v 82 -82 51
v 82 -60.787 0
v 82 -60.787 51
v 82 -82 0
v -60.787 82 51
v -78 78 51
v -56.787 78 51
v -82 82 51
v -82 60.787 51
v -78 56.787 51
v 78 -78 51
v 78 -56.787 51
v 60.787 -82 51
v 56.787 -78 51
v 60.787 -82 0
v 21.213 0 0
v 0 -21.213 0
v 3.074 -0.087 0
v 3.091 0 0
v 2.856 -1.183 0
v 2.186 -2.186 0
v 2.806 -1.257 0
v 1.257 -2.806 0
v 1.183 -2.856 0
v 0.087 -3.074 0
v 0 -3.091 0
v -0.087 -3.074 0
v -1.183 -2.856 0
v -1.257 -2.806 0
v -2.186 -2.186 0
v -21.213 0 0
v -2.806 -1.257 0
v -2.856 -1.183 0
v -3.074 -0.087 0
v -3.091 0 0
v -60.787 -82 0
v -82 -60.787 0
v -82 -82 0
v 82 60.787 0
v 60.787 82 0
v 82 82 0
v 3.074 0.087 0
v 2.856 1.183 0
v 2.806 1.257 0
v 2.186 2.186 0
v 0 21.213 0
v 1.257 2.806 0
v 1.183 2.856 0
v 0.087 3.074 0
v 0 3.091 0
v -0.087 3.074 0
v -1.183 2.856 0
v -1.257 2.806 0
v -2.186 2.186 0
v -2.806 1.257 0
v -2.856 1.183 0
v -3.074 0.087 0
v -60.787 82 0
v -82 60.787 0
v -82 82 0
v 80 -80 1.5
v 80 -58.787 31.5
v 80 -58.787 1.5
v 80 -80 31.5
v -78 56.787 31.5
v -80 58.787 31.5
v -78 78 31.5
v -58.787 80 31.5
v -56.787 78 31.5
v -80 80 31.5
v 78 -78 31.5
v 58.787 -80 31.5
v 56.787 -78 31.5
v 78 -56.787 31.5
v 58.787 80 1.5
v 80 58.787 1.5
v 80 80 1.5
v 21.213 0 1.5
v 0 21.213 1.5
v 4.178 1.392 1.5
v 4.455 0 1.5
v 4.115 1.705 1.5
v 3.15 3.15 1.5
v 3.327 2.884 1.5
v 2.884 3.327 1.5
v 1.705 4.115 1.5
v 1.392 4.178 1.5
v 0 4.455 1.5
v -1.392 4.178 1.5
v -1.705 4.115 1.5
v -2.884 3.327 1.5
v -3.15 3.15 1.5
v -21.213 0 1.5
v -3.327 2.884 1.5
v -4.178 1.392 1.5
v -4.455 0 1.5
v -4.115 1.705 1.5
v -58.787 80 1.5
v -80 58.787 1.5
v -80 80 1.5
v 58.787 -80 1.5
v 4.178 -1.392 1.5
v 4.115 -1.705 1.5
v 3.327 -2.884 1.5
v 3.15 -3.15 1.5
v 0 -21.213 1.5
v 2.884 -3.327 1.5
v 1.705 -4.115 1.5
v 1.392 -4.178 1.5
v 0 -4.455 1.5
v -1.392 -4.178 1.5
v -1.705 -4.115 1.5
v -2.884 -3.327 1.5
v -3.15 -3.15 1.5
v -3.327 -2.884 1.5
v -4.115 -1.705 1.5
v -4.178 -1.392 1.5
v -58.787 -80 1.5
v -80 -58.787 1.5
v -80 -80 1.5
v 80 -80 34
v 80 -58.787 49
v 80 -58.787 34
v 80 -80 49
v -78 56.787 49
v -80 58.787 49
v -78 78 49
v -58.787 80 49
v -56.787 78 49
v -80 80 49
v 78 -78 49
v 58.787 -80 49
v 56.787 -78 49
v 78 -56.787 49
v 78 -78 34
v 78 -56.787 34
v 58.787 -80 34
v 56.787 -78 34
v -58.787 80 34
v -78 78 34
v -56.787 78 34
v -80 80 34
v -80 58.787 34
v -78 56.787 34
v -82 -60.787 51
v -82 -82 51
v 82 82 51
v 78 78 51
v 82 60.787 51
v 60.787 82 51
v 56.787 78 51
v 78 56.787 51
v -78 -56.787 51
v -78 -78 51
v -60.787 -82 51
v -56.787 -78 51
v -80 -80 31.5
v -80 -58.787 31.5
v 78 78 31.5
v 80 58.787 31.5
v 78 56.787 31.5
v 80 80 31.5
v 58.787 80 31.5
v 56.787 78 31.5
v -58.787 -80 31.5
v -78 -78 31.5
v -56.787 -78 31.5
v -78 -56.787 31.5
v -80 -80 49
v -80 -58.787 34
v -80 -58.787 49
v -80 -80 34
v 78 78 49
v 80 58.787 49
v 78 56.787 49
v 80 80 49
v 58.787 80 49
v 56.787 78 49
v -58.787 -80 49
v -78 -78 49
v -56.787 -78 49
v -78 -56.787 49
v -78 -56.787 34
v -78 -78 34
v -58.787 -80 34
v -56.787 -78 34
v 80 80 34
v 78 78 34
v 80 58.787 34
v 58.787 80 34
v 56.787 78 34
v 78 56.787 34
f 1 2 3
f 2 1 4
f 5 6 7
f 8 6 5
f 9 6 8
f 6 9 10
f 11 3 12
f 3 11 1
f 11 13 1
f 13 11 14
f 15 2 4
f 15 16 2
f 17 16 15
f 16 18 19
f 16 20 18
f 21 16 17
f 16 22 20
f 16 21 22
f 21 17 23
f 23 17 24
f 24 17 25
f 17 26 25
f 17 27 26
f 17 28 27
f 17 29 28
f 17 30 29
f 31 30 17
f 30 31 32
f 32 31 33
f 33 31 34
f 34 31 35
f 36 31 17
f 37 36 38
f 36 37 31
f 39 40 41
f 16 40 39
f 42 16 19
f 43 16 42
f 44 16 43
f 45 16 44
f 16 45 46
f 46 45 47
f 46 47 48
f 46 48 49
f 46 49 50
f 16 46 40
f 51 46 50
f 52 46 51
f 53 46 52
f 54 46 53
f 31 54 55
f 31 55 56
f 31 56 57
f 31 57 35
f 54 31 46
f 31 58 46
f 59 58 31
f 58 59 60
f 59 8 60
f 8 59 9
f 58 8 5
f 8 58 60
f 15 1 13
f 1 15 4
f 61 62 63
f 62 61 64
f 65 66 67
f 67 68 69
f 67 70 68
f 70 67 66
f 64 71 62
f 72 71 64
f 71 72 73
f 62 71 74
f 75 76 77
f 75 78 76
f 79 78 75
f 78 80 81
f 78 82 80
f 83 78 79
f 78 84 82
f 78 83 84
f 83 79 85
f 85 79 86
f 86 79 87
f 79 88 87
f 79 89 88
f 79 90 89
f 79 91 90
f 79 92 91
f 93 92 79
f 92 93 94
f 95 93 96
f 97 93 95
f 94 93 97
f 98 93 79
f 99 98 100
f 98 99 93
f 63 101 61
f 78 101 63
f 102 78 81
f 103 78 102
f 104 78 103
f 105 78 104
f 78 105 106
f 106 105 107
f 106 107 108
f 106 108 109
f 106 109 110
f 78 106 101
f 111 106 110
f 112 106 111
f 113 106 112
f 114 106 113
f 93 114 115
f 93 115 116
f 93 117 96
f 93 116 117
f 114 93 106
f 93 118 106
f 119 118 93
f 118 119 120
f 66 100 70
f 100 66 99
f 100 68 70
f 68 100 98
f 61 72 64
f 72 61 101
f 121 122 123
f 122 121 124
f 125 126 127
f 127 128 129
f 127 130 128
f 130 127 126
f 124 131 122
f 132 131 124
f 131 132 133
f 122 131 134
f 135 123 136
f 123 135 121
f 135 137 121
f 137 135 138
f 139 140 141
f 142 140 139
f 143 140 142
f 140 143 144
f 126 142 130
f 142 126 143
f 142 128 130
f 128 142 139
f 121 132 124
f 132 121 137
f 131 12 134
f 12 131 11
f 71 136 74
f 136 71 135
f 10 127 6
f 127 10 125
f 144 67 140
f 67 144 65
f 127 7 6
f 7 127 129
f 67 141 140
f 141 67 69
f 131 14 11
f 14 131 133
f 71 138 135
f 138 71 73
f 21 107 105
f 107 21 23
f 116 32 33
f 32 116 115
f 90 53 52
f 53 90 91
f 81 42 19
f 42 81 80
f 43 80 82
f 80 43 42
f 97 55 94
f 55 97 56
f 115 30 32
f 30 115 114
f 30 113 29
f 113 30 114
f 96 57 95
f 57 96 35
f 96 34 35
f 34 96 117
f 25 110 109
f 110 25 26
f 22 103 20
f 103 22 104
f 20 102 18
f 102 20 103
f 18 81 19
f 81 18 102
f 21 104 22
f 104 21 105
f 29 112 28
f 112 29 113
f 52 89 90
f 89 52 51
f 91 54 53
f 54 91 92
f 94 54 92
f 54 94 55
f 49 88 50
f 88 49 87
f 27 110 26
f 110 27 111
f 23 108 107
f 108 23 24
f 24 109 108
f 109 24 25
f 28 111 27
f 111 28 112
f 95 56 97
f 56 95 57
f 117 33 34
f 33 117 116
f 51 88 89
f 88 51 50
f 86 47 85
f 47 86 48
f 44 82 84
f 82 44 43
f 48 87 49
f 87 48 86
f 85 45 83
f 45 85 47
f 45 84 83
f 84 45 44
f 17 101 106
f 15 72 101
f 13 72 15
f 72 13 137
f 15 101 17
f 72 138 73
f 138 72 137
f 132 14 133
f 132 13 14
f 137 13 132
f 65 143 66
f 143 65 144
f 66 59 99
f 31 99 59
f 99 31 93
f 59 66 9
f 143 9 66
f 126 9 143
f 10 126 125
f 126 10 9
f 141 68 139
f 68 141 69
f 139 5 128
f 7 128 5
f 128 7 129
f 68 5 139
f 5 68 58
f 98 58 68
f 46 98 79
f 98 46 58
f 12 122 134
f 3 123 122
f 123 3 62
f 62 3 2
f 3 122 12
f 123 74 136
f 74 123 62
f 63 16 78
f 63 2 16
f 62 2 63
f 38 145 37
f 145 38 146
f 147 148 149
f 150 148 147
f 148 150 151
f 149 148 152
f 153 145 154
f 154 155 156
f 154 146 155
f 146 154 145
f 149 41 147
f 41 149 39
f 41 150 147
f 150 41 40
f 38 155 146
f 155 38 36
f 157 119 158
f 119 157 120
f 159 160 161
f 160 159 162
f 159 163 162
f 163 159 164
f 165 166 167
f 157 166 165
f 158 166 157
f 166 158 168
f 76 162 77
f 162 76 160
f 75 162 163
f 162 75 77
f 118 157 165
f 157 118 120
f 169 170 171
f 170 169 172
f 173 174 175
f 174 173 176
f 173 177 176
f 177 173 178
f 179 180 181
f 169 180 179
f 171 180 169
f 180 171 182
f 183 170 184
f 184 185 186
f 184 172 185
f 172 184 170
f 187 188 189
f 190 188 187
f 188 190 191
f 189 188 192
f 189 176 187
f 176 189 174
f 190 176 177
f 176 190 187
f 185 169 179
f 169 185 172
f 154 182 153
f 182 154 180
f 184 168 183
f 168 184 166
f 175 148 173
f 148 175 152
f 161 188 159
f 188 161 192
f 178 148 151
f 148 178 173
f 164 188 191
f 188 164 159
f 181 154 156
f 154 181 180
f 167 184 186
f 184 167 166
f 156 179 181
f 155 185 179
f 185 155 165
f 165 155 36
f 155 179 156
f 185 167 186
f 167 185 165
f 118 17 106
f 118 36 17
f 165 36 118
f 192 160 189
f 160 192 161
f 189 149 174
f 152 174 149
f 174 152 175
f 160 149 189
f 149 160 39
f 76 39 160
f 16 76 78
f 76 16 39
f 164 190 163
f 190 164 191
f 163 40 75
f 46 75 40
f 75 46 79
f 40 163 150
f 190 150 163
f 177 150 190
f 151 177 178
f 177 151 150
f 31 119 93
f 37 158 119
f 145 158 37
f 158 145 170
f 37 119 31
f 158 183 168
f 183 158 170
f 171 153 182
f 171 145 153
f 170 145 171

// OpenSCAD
// Pixel matrix holder

/* [Frame Dimensions] */

// Assembled or plated or individual parts?
part = 0; //[0:Preview, 1:Plate, 2:Center, 3:Left arm, 4:Right arm]

// Thickness of holder in mm
thick = 2;

// Display width in mm
widthMM = 160;
// Display height in mm
heightMM = 160;
// Storage/component container thickness in mm
thicknessMM = 47;
// Arm width in mm - bigger means more wrapped around matrix
armMM = 30;

band = armMM;
x=widthMM;
y=heightMM;
z=thicknessMM;

r = x/y;
angle=atan(r);

xi = x-band/2;
yi=y-band/2;
xi=x;
yi=y;

diag = sqrt(xi*xi+yi*yi);

// Radius of center screw in mm
sr = 3;
// Gap for spacing between parts (tune for your printer)
gap=0;

spacing = 1.1*band;

module arm() {
intersection() {
	rotate([0,0,angle]) cube([band,2*y,z+3*thick], center=true);
	difference() {
		cube([x+2*thick,y+2*thick,z+2*thick],center=true);
		translate([0,0,-9])cube([x,y,z-17], center=true);
		translate([0,0,16])cube([x,y,15], center=true);
		translate([0,0,z/2]) cube([x-4,y-4,z+thick], center=true);
		translate([0,0,-(z/2+thick)-.1]) cylinder(r1=sr, r2=sr+thick, h=thick+.2); // hole
		}
	}
}

module X () {
	arm();
	mirror([1,0,0]) arm();
	}

module plug(r, h) {
	//echo(r,h);
	cylinder(r1=r, r2=r+h, h=h, center=true);
	}

module centerCut() {
	translate([0,0,-z/2-thick/2]) {
		rotate([0,0,90-angle]) {
			cube([2*band,band/3,thick+1], center=true);
			translate([band,0,0]) plug(band/5,thick+1);
			translate([-band,0,0]) plug(band/5,thick+1);
			}
		rotate([0,0,90+angle]) {
			cube([2*band,band/3,thick+1], center=true);
			translate([band,0,0]) plug(band/5,thick+1);
			translate([-band,0,0]) plug(band/5,thick+1);
			}
		plug(band/2,thick+1);
		}
	}

module centerHole() {
	translate([0,0,-z/2-thick/2]) {
		rotate([0,0,90-angle]) {
			cube([2*band+2*gap,band/3+2*gap,thick+1], center=true);
			translate([band,0,0]) plug(band/5+gap,thick+1);
			translate([-band,0,0]) plug(band/5+gap,thick+1);
			}
		rotate([0,0,90+angle]) {
			cube([2*band+2*gap,band/3+2*gap,thick+1], center=true);
			translate([band,0,0]) plug(band/5+gap,thick+1);
			translate([-band,0,0]) plug(band/5+gap,thick+1);
			}
		plug(band/2+gap,thick+1);
		}
	cube([x,gap,band], center=true);
	cube([gap,y,band], center=true);;
	}

module center() {
	intersection () {
		X();
		centerCut();
		}
	}

module anArm() {
    ht=z+2*thick;
	intersection() {
		difference() {
			X();
			centerHole();
			}
		translate([0,0,-ht/2]) cube([x/2+thick,y/2+thick,ht]);
		}
	}

module plate() {
	translate([-spacing/2,-band,0]) rotate([0,0,90]) center();
	rotate([0,0,angle]) anArm();
	translate([spacing,0,0]) rotate([0,0,angle]) anArm();
	translate([-spacing,0,0]) mirror([1,0,0]) rotate([0,0,angle]) anArm();
	translate([-2*spacing,0,0]) mirror([1,0,0]) rotate([0,0,angle]) anArm();
	}

module preview() {
	center();
	difference() {
			X();
			centerHole();
			}
		}

translate([0,0,z/2+thick]) {
	if (part==0) preview();
	if (part==1) plate();
	if (part==2) center();
	if (part==3) anArm();
	if (part==4) mirror([1,0,0]) anArm();
	}
